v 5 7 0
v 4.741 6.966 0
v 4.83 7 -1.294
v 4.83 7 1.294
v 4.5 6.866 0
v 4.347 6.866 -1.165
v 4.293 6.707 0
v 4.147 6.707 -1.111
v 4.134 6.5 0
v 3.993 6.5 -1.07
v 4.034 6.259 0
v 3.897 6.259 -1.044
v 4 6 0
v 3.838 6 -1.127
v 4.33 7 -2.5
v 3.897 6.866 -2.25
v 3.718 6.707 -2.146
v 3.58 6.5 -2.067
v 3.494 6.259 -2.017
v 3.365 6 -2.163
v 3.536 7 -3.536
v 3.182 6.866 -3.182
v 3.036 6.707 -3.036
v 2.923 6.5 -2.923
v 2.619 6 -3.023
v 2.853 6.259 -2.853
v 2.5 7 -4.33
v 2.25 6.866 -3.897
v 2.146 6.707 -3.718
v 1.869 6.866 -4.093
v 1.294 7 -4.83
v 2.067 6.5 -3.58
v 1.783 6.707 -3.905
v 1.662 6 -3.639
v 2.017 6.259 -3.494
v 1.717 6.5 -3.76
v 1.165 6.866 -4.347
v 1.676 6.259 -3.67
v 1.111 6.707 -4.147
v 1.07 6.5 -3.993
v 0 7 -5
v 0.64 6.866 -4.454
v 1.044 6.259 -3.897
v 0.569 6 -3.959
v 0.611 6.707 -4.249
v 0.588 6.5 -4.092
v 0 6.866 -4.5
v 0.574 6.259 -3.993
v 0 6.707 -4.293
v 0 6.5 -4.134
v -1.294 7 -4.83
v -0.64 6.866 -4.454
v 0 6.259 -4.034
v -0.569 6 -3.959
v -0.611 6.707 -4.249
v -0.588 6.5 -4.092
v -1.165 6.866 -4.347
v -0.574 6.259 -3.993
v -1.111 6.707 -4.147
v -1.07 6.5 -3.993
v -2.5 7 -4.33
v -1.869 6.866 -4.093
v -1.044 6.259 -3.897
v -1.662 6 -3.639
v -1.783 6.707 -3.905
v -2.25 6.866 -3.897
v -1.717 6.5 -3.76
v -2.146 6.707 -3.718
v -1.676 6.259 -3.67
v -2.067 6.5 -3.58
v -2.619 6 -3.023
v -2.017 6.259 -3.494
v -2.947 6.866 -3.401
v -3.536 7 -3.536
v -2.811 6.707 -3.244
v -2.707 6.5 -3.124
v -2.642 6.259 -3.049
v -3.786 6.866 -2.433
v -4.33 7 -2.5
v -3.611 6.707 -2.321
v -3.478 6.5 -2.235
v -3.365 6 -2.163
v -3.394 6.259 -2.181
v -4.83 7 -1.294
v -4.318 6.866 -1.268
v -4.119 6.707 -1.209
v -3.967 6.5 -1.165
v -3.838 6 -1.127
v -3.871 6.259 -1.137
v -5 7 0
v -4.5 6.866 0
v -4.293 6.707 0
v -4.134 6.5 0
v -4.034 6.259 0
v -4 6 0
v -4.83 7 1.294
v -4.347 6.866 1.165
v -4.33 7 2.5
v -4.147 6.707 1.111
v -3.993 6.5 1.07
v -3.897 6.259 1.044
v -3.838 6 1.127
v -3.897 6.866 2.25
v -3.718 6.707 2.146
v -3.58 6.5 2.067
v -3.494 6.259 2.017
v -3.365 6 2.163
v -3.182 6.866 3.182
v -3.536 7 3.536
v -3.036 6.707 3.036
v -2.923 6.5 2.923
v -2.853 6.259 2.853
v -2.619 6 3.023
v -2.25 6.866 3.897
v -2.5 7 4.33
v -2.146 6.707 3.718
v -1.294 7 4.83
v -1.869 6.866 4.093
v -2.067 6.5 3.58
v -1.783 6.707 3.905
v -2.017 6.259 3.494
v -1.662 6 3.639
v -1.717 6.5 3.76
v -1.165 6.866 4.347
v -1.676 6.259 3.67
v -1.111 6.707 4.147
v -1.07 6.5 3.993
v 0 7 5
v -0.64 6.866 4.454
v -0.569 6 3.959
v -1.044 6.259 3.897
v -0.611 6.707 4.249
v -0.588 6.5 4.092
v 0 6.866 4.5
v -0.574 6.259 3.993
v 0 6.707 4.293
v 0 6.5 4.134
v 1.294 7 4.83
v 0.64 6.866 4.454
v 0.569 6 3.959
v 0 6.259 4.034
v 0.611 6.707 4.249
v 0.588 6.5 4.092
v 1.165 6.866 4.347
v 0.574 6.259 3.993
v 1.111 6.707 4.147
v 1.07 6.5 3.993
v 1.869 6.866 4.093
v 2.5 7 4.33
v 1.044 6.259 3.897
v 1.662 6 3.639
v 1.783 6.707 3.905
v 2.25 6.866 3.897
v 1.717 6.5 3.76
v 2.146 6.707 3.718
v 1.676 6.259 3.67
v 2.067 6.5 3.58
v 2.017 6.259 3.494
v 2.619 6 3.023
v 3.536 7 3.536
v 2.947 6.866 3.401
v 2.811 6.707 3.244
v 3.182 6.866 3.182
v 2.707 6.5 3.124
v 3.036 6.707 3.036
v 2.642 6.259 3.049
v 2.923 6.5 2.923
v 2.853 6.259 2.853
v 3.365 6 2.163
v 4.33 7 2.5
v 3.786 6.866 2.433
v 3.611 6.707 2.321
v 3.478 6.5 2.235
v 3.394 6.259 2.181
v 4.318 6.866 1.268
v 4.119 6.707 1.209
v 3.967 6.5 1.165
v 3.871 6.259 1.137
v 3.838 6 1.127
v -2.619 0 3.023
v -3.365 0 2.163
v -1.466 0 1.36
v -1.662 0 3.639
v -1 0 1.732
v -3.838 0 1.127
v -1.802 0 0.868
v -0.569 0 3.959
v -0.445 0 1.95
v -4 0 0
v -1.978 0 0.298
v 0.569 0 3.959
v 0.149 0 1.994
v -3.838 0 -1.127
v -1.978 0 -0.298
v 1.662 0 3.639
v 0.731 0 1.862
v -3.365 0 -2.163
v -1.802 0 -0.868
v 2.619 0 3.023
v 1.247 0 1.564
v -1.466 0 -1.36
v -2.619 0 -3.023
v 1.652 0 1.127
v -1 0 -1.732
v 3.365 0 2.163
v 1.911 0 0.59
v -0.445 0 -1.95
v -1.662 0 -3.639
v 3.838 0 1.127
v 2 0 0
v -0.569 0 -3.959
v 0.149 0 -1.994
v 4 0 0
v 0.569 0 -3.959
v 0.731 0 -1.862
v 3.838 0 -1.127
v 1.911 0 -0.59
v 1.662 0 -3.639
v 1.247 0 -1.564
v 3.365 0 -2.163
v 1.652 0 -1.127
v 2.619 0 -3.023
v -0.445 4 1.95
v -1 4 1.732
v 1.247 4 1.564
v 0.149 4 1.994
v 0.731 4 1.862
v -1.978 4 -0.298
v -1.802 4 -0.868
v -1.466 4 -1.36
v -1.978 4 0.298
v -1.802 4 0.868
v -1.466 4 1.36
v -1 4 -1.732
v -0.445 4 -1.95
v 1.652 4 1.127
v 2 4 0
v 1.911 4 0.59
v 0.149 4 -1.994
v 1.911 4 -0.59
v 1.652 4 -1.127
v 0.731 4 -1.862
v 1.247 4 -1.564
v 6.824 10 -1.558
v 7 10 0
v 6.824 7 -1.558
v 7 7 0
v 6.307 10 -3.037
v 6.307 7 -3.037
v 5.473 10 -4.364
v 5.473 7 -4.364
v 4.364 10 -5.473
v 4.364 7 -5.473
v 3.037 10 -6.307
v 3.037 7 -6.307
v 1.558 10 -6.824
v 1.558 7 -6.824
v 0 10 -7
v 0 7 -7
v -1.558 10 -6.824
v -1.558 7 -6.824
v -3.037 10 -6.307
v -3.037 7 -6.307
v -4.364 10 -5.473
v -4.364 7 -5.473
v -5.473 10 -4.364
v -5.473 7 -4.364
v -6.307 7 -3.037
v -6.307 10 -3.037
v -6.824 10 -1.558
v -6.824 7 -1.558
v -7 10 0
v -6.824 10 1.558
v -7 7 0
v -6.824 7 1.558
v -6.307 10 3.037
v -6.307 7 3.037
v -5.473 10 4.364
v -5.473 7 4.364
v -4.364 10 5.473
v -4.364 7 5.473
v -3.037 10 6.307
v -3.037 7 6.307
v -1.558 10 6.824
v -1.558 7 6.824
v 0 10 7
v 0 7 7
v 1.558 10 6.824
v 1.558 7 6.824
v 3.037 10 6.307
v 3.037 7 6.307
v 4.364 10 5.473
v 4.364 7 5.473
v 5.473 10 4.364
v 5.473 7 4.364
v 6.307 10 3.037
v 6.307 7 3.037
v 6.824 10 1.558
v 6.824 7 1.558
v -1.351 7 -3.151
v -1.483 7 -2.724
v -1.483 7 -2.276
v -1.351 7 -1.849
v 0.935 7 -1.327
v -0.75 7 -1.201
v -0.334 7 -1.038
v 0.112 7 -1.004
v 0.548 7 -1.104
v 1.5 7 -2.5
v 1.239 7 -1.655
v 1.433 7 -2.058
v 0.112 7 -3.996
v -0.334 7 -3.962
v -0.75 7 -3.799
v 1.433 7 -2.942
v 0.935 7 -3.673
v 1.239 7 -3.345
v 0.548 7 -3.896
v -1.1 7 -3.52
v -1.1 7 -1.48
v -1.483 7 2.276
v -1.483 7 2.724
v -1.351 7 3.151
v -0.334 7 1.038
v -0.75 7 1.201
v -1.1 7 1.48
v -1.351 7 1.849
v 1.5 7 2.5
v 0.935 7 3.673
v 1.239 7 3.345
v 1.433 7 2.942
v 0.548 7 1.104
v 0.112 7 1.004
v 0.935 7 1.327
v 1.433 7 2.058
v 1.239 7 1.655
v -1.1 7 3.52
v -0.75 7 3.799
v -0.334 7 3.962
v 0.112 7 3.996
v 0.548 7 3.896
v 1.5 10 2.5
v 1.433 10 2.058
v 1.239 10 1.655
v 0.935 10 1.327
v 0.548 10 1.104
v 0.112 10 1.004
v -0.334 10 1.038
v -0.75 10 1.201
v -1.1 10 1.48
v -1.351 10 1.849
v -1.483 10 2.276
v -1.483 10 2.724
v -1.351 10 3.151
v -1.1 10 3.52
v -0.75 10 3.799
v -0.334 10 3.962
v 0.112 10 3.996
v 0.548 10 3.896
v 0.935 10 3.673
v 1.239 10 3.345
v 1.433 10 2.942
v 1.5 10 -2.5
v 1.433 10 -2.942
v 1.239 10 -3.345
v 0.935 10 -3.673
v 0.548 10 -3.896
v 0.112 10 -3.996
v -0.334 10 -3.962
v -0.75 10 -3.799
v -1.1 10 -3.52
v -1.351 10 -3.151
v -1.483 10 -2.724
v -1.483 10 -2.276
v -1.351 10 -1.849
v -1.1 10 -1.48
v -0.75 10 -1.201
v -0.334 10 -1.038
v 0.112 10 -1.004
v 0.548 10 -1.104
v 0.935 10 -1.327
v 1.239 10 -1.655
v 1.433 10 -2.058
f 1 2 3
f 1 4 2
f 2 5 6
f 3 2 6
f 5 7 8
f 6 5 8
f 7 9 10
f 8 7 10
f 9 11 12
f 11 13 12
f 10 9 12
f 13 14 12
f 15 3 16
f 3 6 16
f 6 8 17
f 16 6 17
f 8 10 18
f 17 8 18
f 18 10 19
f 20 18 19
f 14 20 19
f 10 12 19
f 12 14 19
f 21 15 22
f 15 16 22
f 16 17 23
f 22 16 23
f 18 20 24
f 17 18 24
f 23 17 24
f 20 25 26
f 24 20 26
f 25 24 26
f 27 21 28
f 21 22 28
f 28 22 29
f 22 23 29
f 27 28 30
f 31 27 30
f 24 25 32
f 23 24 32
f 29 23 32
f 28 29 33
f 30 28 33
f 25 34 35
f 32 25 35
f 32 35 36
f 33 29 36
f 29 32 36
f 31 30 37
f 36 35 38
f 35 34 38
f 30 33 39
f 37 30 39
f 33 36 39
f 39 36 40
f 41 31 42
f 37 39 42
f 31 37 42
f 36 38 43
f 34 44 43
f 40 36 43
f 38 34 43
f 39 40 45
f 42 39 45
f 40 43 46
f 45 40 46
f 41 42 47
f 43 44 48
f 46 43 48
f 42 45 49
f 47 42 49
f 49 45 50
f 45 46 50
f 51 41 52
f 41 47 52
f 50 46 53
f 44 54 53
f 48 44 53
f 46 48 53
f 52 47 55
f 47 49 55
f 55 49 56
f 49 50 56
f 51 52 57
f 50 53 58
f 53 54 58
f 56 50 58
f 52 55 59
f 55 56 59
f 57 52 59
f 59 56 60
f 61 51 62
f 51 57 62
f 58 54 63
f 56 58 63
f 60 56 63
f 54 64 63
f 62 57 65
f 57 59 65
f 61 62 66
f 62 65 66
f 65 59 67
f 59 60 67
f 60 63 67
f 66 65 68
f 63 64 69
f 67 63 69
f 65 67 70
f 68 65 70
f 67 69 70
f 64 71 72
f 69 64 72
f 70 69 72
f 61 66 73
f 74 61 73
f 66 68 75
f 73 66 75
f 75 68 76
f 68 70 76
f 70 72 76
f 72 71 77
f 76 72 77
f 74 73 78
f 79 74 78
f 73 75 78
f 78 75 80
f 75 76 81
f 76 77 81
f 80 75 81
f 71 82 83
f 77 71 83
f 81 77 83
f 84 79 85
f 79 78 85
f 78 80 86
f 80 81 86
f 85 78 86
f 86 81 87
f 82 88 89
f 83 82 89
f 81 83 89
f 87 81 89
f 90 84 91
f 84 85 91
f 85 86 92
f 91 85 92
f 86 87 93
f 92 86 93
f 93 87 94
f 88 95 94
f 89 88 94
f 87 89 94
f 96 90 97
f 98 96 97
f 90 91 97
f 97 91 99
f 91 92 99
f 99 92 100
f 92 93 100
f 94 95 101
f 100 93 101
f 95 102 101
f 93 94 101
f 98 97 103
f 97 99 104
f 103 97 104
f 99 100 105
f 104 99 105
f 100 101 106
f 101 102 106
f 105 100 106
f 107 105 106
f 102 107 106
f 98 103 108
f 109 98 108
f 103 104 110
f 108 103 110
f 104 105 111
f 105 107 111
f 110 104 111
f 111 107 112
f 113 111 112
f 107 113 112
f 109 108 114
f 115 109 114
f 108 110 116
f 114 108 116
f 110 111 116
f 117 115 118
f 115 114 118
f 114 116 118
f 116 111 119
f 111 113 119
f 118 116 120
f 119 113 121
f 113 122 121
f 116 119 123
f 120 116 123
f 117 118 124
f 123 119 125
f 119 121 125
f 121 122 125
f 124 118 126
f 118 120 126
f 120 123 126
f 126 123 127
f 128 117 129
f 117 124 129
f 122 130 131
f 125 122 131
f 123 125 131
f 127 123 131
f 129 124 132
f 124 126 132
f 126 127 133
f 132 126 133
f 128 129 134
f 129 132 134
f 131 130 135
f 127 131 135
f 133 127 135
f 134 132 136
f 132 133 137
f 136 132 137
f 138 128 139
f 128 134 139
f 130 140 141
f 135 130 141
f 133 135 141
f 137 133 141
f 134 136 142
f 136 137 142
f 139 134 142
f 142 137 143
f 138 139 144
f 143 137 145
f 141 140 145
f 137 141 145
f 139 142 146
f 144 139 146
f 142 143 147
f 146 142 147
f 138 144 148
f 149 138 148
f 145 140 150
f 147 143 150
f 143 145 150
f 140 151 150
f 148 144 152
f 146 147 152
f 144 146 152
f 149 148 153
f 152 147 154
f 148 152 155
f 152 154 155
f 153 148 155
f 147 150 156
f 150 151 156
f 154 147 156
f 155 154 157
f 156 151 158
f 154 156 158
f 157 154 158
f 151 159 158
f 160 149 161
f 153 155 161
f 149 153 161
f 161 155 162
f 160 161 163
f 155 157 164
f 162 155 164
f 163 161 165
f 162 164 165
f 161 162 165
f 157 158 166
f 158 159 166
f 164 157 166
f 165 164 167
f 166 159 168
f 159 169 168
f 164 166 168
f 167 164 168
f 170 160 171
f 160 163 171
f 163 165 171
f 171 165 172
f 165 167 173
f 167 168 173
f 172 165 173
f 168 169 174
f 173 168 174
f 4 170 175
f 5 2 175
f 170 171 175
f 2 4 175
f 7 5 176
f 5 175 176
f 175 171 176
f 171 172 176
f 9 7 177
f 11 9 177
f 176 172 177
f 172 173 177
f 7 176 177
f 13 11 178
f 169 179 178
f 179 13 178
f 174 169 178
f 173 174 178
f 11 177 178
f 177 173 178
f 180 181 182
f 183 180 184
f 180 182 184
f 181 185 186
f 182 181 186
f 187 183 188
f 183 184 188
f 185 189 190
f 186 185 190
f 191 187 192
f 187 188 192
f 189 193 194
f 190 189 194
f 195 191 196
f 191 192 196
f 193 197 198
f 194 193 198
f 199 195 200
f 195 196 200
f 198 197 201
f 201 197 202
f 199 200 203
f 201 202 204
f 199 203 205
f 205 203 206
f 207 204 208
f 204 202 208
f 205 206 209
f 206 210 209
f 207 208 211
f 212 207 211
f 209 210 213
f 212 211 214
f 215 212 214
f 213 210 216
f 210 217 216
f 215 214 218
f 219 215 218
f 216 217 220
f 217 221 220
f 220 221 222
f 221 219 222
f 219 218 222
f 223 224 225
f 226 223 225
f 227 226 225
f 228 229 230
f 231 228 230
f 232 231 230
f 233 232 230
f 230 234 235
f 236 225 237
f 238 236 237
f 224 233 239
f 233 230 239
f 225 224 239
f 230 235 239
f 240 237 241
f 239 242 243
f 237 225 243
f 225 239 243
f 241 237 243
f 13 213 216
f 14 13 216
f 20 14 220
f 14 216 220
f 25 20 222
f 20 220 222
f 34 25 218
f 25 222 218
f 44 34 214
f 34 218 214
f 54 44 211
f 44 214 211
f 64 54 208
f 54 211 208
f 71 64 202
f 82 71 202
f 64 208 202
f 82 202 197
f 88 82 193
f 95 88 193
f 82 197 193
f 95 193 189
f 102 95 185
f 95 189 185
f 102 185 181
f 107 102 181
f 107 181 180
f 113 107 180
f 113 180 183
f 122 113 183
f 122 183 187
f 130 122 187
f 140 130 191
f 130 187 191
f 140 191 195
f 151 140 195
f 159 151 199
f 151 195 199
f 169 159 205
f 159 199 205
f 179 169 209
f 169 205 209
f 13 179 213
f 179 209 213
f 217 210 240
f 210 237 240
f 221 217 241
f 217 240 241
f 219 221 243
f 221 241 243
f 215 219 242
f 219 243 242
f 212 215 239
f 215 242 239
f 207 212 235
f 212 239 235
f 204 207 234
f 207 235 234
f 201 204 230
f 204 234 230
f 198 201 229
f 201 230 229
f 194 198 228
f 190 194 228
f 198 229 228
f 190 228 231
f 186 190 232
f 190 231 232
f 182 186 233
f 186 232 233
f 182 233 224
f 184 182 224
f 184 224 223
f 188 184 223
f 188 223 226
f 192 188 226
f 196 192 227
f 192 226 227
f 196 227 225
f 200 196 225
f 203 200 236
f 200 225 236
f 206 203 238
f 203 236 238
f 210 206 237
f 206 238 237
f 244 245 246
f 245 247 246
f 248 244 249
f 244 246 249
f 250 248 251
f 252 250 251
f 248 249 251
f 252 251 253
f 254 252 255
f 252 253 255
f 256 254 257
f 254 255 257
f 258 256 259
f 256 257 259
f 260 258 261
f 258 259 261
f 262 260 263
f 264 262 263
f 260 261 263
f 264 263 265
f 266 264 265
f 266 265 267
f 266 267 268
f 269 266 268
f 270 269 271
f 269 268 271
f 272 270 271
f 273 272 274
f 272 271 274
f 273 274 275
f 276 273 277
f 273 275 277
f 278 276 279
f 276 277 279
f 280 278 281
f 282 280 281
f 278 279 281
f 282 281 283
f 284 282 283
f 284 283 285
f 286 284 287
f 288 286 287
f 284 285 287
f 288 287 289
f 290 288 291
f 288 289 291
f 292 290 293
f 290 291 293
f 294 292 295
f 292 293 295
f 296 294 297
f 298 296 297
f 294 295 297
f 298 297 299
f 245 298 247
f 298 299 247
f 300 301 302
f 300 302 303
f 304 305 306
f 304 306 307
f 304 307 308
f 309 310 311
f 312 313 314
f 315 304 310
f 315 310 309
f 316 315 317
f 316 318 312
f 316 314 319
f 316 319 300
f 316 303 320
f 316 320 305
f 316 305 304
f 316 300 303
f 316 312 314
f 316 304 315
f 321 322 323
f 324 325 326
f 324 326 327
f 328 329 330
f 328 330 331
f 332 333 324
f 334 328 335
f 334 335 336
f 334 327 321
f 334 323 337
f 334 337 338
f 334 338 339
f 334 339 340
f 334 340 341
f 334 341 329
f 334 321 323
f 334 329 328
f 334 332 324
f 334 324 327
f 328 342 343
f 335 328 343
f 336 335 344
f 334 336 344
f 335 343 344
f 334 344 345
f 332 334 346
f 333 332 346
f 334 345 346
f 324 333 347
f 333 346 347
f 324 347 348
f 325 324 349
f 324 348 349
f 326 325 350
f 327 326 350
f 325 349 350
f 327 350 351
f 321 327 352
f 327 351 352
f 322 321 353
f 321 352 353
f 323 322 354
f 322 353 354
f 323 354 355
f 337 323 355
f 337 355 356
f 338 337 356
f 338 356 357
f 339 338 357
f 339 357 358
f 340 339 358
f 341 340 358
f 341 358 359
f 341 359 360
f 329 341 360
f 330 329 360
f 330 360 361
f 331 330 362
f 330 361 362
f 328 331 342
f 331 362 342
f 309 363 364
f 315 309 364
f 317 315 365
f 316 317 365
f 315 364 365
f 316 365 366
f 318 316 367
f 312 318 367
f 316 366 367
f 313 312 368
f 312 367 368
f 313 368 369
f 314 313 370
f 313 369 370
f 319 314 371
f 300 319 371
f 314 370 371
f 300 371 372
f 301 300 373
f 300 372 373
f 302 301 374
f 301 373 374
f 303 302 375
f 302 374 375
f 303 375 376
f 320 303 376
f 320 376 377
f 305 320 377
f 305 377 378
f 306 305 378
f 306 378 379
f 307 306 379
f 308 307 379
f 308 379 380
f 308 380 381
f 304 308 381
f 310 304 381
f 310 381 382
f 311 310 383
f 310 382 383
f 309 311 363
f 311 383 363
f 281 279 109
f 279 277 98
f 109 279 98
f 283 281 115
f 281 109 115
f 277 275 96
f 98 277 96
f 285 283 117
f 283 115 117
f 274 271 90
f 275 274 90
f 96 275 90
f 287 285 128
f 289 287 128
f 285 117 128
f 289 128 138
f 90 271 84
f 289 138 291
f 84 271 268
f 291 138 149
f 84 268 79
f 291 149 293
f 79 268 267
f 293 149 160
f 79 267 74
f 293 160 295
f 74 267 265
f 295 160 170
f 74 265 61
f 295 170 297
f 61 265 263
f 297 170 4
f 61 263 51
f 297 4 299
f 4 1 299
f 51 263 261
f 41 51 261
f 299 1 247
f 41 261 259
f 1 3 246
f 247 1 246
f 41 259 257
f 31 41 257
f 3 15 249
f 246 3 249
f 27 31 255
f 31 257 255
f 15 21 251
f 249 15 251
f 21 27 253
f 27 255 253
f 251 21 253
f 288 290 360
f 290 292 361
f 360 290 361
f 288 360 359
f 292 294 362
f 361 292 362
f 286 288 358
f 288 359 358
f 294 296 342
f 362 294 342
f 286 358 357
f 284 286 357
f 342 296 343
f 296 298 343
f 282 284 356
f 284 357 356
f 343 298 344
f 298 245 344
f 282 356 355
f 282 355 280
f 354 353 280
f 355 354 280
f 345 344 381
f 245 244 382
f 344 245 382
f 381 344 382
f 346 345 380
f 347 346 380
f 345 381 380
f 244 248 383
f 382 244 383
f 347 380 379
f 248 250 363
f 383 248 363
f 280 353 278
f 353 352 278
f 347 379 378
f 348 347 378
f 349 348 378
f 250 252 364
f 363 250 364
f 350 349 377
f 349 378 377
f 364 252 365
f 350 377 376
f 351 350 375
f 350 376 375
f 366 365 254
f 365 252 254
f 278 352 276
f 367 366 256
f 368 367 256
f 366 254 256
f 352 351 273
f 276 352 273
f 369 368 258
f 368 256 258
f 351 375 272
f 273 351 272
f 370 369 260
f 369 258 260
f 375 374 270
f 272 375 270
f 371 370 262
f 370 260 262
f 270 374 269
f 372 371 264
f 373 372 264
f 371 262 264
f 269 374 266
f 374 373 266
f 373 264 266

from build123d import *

# Parameters (mm, degrees)
FILLET1_R          = 1
SKETCH2_R          = 1.5
CUT_EXTRUDE1_DEPTH = 3


with BuildPart() as part:
    # Sketch1 → Revolve1 (revolve)
    with BuildSketch(Plane.XY):
        Polygon((2, 0), (2, 4), (0, 4), (0, 10), (7, 10), (7, 7), (4, 7), (4, 0), align=None)
    revolve(axis=Axis((0, 4, 0), (0, 1, 0)))

    # Fillet1
    fillet1_edges = [part.edges().sort_by_distance(p)[0] for p in [
        (-4, 7, 0),
    ]]
    fillet(fillet1_edges, radius=FILLET1_R)

    # Sketch2 → Cut-Extrude1 (cut)
    with BuildSketch(Plane(origin=(0, 10, 0), x_dir=(1, 0, 0), z_dir=(0, 1, 0))):
        with Locations((0, 2.5)):
            Circle(SKETCH2_R)
        with Locations((0, -2.5)):
            Circle(SKETCH2_R)
    extrude(amount=-CUT_EXTRUDE1_DEPTH, mode=Mode.SUBTRACT)


solid = part.part
